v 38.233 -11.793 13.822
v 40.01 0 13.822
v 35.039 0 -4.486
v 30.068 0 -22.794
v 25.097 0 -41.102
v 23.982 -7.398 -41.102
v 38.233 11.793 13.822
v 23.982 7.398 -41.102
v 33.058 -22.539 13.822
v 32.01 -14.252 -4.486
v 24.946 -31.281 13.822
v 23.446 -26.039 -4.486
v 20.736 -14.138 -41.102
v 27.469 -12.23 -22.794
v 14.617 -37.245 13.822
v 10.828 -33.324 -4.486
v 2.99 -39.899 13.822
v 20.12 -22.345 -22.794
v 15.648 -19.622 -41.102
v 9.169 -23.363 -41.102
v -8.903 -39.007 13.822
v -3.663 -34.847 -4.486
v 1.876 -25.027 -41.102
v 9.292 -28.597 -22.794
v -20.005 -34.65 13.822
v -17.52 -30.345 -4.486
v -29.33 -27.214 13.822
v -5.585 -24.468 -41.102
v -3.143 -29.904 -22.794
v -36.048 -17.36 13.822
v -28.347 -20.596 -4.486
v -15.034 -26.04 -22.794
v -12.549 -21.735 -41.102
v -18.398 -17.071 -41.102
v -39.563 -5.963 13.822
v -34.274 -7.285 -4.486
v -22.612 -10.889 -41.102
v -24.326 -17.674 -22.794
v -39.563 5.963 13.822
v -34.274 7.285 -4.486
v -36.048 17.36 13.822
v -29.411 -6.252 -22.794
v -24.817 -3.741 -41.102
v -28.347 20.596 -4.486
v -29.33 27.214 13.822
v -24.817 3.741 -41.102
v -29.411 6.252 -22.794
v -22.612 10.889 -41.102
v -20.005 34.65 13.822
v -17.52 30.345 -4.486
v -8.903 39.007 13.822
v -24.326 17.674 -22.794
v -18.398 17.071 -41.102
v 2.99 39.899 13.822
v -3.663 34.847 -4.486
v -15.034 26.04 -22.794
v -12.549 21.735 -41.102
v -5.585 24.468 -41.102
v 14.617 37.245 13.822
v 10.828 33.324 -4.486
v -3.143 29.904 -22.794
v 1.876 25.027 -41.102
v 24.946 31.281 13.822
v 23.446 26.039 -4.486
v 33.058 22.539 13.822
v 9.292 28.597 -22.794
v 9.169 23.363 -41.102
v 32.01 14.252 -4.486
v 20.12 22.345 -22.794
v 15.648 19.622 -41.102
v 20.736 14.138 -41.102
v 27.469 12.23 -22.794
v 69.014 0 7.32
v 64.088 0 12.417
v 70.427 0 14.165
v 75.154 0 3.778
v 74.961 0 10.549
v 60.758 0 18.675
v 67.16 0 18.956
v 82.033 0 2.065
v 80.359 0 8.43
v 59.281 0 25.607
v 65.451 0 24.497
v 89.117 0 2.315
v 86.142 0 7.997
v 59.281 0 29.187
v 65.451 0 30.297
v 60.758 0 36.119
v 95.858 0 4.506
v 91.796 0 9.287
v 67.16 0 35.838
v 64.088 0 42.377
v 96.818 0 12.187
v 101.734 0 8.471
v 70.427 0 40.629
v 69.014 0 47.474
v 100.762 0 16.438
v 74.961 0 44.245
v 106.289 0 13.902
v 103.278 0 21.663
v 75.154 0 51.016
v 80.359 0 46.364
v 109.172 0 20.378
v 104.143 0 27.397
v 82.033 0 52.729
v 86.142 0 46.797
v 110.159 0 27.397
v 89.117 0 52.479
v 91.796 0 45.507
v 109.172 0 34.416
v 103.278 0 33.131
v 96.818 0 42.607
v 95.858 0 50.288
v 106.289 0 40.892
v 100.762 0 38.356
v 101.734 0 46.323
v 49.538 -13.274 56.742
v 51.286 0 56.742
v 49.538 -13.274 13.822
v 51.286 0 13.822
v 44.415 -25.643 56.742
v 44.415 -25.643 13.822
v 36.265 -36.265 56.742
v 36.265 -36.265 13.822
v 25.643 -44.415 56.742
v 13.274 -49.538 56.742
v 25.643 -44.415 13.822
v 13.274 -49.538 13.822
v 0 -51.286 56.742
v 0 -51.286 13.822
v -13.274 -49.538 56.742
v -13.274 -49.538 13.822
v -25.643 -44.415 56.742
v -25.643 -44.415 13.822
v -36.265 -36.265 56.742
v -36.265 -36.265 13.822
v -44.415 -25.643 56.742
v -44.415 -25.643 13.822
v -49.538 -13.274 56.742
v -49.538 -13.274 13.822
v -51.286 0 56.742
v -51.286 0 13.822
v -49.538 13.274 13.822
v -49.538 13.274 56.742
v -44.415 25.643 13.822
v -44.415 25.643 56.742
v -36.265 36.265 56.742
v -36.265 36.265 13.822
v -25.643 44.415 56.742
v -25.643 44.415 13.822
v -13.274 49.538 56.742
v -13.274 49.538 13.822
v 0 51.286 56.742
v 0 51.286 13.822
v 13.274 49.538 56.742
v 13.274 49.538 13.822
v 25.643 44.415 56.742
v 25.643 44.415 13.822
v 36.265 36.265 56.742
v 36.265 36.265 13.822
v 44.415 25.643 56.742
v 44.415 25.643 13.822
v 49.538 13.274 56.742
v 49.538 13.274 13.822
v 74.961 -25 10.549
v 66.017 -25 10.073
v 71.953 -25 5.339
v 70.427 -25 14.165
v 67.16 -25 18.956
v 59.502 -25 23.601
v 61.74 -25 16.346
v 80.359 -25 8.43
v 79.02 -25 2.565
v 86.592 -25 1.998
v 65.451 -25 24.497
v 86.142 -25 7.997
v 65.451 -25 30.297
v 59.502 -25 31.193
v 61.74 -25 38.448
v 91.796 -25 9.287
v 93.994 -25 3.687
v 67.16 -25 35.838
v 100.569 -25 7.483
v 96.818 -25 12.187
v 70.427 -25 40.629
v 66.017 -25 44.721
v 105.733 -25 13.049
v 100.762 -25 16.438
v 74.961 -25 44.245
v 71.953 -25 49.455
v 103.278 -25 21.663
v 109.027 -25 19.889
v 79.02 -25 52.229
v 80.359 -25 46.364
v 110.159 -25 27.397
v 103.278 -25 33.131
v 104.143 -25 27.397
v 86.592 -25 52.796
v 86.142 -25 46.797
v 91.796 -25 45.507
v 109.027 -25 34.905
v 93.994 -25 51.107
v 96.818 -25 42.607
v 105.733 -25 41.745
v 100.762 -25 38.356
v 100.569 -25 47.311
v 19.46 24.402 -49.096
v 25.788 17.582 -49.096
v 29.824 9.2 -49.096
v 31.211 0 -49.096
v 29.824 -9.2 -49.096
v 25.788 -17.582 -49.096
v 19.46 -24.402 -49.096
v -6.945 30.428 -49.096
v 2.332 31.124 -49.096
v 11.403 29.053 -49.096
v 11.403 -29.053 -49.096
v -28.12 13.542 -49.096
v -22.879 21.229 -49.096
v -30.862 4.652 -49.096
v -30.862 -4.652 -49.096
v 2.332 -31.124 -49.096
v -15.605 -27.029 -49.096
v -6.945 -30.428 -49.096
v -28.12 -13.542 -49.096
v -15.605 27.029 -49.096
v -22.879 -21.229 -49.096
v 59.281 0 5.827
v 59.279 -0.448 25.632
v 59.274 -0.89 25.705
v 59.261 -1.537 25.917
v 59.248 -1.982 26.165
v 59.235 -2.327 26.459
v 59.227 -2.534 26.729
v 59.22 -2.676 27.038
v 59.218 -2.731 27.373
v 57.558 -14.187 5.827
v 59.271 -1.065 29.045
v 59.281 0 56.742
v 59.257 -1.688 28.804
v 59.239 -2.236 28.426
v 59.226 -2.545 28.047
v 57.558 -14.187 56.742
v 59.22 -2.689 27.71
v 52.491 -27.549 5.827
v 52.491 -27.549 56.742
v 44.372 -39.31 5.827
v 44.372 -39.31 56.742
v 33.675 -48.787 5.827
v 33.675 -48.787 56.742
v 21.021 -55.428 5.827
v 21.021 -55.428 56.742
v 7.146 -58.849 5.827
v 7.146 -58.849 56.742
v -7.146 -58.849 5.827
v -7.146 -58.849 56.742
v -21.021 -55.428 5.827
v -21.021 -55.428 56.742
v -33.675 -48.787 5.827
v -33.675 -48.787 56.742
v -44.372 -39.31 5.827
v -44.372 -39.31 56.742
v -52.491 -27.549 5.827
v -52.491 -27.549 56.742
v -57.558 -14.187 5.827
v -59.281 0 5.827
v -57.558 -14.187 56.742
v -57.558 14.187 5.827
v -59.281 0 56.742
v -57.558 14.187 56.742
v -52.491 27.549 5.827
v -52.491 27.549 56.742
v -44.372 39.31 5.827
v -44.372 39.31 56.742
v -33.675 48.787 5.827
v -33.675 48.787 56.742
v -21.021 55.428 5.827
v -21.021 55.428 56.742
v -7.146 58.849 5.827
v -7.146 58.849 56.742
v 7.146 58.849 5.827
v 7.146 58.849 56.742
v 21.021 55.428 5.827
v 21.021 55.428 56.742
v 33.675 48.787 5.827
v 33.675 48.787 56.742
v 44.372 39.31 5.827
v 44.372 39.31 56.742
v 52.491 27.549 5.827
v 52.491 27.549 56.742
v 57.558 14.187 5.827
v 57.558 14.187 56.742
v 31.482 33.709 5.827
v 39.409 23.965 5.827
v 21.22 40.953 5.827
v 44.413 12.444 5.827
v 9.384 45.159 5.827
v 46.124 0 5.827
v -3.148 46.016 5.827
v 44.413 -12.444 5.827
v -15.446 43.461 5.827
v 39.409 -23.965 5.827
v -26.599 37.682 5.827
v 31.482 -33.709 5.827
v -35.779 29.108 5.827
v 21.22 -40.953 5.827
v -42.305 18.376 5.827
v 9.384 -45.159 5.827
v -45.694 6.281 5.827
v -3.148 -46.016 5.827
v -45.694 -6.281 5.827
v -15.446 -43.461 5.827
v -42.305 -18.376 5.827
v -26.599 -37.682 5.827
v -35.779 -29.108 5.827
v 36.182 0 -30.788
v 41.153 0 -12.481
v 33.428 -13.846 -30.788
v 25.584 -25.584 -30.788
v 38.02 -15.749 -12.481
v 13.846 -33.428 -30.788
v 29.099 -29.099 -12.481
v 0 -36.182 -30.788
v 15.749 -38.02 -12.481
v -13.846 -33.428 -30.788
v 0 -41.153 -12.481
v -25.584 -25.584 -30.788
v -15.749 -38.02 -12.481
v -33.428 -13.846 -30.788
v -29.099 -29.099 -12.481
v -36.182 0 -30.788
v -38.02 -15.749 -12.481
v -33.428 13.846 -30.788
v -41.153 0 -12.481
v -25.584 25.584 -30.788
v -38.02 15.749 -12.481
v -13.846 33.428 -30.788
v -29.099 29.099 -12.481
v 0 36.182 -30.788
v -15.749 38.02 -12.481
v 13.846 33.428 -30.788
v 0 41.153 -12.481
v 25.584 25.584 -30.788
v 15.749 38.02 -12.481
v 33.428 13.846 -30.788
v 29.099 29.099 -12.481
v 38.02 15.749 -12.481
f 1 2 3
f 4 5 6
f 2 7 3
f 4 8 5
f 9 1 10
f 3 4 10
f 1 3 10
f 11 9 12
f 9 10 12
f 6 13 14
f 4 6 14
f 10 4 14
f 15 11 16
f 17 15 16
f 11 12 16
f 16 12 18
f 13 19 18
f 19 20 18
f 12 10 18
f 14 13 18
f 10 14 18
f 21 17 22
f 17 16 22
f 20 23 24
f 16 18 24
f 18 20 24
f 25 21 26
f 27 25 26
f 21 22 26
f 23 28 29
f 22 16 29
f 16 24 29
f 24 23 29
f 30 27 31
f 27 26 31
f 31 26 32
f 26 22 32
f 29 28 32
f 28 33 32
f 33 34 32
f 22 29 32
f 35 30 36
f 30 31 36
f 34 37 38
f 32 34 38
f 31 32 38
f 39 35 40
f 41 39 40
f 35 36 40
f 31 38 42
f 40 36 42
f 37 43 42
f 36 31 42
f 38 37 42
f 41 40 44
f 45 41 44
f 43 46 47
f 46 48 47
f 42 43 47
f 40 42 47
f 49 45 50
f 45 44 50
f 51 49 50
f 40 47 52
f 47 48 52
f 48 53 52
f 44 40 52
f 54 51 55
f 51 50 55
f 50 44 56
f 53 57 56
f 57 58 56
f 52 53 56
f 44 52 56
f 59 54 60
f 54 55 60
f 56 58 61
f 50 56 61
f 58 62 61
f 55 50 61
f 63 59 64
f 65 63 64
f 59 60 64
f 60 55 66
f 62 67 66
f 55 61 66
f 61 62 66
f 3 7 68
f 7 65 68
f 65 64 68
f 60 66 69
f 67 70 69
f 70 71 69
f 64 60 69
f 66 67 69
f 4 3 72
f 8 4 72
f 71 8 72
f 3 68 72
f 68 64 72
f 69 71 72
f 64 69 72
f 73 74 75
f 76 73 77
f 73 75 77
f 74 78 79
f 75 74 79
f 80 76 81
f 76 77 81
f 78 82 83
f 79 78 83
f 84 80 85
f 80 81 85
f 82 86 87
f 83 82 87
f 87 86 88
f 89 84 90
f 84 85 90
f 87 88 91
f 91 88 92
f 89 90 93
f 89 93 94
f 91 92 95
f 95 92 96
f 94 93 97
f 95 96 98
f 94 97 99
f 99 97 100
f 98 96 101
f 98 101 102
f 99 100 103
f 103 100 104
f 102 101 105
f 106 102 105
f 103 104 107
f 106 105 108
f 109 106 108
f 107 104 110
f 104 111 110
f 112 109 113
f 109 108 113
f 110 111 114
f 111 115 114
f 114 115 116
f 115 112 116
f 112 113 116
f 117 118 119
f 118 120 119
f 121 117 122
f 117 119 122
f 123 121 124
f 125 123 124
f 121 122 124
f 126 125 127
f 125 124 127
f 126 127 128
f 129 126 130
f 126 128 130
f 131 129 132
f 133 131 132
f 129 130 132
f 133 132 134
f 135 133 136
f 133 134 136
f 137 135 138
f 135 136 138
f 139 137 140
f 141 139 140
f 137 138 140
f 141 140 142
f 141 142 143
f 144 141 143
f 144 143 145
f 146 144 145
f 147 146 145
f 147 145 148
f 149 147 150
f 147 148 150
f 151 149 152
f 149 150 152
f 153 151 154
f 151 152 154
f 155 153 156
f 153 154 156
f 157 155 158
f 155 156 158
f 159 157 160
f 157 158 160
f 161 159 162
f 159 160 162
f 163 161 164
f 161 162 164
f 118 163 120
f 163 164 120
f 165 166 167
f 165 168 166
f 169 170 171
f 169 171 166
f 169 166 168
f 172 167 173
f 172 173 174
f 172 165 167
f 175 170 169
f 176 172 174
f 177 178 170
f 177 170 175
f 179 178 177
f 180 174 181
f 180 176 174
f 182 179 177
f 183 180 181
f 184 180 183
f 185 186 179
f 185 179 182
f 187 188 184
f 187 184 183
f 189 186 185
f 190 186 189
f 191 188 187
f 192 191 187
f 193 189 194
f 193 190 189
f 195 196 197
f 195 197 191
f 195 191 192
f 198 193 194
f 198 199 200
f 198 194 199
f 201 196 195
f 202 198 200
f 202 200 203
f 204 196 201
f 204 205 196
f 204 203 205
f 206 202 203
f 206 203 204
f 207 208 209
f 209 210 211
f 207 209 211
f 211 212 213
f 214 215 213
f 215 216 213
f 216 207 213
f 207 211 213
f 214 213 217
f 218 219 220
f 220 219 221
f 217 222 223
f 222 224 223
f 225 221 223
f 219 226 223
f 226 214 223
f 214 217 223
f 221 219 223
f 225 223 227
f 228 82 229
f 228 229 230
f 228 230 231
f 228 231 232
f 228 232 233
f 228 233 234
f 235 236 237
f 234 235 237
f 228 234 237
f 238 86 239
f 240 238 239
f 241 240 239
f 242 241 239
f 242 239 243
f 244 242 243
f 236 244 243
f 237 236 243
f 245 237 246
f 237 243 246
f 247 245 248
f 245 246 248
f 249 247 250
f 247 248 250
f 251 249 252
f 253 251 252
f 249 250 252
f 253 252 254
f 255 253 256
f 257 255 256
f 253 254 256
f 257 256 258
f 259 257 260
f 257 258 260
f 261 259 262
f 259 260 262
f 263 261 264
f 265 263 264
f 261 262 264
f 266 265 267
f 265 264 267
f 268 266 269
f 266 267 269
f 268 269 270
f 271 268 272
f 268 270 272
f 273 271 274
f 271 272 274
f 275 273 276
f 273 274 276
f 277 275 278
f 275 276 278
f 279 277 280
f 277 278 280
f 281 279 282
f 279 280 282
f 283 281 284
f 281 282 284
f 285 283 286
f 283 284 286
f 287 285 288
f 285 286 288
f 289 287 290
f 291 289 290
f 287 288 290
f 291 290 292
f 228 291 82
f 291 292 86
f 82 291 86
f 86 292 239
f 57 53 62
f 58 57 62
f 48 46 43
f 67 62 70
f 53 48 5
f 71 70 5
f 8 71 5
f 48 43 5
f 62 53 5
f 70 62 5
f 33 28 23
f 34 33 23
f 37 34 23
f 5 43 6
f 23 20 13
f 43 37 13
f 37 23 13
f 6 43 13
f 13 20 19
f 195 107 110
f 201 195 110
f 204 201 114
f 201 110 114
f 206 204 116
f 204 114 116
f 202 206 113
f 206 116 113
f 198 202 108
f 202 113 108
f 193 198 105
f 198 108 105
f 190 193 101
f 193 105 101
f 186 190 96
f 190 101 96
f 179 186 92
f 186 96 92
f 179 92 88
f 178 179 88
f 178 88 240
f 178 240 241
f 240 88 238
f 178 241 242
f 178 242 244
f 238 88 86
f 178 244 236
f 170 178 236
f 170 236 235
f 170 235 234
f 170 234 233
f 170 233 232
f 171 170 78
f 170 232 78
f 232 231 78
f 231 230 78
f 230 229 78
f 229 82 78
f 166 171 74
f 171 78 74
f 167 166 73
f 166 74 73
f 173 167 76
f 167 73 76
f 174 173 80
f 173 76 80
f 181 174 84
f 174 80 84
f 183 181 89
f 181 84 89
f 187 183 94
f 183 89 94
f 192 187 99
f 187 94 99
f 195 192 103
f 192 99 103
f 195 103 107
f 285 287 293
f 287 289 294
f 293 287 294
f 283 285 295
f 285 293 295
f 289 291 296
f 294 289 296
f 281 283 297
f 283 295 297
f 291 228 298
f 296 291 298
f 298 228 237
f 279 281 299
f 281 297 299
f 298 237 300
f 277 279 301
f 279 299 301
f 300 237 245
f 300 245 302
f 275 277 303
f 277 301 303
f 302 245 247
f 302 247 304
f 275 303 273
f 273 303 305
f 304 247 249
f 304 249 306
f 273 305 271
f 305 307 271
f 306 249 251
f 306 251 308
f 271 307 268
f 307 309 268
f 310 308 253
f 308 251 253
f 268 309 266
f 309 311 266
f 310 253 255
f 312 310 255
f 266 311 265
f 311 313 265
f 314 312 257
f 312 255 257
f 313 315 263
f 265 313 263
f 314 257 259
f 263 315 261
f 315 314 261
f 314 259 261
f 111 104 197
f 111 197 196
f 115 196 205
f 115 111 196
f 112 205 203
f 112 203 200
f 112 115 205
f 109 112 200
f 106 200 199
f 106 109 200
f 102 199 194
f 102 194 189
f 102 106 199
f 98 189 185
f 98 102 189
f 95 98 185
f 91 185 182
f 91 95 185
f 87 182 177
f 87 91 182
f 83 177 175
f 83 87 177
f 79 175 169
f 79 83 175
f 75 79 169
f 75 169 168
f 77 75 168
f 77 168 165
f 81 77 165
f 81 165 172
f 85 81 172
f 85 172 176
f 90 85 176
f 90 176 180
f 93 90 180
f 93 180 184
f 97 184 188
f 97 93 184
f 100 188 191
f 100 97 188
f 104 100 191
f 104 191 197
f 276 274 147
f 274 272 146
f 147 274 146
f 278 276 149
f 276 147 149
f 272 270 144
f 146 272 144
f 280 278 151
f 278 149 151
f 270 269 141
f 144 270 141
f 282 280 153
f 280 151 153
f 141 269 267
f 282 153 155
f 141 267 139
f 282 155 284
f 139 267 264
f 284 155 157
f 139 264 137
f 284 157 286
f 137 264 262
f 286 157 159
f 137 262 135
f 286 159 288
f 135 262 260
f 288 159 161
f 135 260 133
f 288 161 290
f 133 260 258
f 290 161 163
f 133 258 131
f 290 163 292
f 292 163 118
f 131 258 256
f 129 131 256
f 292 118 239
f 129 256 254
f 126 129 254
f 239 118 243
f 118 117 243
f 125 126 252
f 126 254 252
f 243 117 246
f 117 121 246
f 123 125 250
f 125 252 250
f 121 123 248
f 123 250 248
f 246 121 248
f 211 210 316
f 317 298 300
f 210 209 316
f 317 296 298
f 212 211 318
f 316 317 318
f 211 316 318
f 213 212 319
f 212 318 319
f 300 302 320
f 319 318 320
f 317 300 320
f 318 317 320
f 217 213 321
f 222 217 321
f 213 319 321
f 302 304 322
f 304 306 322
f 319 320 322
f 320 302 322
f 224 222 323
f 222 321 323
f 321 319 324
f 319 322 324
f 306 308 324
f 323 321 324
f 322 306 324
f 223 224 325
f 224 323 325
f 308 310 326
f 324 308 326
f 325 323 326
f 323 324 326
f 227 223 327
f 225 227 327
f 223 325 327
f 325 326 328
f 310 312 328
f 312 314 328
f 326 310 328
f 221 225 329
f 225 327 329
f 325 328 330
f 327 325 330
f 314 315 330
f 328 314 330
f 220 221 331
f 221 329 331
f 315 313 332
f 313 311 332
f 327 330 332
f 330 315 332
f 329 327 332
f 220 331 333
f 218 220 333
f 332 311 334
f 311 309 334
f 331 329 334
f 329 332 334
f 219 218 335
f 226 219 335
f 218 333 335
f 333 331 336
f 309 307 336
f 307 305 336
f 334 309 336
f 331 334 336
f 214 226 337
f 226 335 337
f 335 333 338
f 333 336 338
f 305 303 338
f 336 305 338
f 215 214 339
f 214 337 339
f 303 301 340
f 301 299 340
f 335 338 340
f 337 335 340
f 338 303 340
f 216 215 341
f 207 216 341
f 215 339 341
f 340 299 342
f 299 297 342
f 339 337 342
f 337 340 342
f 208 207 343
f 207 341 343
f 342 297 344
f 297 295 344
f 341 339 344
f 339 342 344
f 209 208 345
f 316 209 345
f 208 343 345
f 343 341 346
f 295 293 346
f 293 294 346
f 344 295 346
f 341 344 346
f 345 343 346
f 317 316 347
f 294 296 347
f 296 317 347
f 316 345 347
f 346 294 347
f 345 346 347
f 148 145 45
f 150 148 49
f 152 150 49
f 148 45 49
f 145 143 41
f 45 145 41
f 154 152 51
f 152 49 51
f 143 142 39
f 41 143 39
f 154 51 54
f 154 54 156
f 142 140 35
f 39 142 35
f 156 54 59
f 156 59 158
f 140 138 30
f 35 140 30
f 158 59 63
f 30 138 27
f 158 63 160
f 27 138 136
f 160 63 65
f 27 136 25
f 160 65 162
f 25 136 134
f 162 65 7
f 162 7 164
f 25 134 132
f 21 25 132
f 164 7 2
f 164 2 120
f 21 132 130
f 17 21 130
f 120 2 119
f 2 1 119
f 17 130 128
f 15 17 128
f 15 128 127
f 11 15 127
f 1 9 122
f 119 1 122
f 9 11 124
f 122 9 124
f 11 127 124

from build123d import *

# Parameters (mm, degrees)
F2_R     = 25.470351
F2_R_2   = 19.454516
F3_DEPTH = 25


with BuildPart() as f1:
    # F0 (on Front) → F1 (revolve)
    with BuildSketch(Plane.XZ):
        Polygon((25.09743, -41.101545), (0, -41.101545), (0, -49.096275), (31.210871, -49.096275), (46.123819, 5.827051), (59.280757, 5.827051), (59.280757, 56.741983), (51.286027, 56.741983), (51.286027, 13.821781), (40.010378, 13.821781), align=None)
    revolve(axis=Axis((0, 0, -45.09891), (0, 0, -1)))

    # F2 (on Front) → F3 (join)
    with BuildSketch(Plane.XZ):
        with Locations((84.688164, 27.397014)):
            Circle(F2_R)
        with Locations((84.688164, 27.397014)):
            Circle(F2_R_2, mode=Mode.SUBTRACT)
    extrude(amount=F3_DEPTH)


solid = f1.part
